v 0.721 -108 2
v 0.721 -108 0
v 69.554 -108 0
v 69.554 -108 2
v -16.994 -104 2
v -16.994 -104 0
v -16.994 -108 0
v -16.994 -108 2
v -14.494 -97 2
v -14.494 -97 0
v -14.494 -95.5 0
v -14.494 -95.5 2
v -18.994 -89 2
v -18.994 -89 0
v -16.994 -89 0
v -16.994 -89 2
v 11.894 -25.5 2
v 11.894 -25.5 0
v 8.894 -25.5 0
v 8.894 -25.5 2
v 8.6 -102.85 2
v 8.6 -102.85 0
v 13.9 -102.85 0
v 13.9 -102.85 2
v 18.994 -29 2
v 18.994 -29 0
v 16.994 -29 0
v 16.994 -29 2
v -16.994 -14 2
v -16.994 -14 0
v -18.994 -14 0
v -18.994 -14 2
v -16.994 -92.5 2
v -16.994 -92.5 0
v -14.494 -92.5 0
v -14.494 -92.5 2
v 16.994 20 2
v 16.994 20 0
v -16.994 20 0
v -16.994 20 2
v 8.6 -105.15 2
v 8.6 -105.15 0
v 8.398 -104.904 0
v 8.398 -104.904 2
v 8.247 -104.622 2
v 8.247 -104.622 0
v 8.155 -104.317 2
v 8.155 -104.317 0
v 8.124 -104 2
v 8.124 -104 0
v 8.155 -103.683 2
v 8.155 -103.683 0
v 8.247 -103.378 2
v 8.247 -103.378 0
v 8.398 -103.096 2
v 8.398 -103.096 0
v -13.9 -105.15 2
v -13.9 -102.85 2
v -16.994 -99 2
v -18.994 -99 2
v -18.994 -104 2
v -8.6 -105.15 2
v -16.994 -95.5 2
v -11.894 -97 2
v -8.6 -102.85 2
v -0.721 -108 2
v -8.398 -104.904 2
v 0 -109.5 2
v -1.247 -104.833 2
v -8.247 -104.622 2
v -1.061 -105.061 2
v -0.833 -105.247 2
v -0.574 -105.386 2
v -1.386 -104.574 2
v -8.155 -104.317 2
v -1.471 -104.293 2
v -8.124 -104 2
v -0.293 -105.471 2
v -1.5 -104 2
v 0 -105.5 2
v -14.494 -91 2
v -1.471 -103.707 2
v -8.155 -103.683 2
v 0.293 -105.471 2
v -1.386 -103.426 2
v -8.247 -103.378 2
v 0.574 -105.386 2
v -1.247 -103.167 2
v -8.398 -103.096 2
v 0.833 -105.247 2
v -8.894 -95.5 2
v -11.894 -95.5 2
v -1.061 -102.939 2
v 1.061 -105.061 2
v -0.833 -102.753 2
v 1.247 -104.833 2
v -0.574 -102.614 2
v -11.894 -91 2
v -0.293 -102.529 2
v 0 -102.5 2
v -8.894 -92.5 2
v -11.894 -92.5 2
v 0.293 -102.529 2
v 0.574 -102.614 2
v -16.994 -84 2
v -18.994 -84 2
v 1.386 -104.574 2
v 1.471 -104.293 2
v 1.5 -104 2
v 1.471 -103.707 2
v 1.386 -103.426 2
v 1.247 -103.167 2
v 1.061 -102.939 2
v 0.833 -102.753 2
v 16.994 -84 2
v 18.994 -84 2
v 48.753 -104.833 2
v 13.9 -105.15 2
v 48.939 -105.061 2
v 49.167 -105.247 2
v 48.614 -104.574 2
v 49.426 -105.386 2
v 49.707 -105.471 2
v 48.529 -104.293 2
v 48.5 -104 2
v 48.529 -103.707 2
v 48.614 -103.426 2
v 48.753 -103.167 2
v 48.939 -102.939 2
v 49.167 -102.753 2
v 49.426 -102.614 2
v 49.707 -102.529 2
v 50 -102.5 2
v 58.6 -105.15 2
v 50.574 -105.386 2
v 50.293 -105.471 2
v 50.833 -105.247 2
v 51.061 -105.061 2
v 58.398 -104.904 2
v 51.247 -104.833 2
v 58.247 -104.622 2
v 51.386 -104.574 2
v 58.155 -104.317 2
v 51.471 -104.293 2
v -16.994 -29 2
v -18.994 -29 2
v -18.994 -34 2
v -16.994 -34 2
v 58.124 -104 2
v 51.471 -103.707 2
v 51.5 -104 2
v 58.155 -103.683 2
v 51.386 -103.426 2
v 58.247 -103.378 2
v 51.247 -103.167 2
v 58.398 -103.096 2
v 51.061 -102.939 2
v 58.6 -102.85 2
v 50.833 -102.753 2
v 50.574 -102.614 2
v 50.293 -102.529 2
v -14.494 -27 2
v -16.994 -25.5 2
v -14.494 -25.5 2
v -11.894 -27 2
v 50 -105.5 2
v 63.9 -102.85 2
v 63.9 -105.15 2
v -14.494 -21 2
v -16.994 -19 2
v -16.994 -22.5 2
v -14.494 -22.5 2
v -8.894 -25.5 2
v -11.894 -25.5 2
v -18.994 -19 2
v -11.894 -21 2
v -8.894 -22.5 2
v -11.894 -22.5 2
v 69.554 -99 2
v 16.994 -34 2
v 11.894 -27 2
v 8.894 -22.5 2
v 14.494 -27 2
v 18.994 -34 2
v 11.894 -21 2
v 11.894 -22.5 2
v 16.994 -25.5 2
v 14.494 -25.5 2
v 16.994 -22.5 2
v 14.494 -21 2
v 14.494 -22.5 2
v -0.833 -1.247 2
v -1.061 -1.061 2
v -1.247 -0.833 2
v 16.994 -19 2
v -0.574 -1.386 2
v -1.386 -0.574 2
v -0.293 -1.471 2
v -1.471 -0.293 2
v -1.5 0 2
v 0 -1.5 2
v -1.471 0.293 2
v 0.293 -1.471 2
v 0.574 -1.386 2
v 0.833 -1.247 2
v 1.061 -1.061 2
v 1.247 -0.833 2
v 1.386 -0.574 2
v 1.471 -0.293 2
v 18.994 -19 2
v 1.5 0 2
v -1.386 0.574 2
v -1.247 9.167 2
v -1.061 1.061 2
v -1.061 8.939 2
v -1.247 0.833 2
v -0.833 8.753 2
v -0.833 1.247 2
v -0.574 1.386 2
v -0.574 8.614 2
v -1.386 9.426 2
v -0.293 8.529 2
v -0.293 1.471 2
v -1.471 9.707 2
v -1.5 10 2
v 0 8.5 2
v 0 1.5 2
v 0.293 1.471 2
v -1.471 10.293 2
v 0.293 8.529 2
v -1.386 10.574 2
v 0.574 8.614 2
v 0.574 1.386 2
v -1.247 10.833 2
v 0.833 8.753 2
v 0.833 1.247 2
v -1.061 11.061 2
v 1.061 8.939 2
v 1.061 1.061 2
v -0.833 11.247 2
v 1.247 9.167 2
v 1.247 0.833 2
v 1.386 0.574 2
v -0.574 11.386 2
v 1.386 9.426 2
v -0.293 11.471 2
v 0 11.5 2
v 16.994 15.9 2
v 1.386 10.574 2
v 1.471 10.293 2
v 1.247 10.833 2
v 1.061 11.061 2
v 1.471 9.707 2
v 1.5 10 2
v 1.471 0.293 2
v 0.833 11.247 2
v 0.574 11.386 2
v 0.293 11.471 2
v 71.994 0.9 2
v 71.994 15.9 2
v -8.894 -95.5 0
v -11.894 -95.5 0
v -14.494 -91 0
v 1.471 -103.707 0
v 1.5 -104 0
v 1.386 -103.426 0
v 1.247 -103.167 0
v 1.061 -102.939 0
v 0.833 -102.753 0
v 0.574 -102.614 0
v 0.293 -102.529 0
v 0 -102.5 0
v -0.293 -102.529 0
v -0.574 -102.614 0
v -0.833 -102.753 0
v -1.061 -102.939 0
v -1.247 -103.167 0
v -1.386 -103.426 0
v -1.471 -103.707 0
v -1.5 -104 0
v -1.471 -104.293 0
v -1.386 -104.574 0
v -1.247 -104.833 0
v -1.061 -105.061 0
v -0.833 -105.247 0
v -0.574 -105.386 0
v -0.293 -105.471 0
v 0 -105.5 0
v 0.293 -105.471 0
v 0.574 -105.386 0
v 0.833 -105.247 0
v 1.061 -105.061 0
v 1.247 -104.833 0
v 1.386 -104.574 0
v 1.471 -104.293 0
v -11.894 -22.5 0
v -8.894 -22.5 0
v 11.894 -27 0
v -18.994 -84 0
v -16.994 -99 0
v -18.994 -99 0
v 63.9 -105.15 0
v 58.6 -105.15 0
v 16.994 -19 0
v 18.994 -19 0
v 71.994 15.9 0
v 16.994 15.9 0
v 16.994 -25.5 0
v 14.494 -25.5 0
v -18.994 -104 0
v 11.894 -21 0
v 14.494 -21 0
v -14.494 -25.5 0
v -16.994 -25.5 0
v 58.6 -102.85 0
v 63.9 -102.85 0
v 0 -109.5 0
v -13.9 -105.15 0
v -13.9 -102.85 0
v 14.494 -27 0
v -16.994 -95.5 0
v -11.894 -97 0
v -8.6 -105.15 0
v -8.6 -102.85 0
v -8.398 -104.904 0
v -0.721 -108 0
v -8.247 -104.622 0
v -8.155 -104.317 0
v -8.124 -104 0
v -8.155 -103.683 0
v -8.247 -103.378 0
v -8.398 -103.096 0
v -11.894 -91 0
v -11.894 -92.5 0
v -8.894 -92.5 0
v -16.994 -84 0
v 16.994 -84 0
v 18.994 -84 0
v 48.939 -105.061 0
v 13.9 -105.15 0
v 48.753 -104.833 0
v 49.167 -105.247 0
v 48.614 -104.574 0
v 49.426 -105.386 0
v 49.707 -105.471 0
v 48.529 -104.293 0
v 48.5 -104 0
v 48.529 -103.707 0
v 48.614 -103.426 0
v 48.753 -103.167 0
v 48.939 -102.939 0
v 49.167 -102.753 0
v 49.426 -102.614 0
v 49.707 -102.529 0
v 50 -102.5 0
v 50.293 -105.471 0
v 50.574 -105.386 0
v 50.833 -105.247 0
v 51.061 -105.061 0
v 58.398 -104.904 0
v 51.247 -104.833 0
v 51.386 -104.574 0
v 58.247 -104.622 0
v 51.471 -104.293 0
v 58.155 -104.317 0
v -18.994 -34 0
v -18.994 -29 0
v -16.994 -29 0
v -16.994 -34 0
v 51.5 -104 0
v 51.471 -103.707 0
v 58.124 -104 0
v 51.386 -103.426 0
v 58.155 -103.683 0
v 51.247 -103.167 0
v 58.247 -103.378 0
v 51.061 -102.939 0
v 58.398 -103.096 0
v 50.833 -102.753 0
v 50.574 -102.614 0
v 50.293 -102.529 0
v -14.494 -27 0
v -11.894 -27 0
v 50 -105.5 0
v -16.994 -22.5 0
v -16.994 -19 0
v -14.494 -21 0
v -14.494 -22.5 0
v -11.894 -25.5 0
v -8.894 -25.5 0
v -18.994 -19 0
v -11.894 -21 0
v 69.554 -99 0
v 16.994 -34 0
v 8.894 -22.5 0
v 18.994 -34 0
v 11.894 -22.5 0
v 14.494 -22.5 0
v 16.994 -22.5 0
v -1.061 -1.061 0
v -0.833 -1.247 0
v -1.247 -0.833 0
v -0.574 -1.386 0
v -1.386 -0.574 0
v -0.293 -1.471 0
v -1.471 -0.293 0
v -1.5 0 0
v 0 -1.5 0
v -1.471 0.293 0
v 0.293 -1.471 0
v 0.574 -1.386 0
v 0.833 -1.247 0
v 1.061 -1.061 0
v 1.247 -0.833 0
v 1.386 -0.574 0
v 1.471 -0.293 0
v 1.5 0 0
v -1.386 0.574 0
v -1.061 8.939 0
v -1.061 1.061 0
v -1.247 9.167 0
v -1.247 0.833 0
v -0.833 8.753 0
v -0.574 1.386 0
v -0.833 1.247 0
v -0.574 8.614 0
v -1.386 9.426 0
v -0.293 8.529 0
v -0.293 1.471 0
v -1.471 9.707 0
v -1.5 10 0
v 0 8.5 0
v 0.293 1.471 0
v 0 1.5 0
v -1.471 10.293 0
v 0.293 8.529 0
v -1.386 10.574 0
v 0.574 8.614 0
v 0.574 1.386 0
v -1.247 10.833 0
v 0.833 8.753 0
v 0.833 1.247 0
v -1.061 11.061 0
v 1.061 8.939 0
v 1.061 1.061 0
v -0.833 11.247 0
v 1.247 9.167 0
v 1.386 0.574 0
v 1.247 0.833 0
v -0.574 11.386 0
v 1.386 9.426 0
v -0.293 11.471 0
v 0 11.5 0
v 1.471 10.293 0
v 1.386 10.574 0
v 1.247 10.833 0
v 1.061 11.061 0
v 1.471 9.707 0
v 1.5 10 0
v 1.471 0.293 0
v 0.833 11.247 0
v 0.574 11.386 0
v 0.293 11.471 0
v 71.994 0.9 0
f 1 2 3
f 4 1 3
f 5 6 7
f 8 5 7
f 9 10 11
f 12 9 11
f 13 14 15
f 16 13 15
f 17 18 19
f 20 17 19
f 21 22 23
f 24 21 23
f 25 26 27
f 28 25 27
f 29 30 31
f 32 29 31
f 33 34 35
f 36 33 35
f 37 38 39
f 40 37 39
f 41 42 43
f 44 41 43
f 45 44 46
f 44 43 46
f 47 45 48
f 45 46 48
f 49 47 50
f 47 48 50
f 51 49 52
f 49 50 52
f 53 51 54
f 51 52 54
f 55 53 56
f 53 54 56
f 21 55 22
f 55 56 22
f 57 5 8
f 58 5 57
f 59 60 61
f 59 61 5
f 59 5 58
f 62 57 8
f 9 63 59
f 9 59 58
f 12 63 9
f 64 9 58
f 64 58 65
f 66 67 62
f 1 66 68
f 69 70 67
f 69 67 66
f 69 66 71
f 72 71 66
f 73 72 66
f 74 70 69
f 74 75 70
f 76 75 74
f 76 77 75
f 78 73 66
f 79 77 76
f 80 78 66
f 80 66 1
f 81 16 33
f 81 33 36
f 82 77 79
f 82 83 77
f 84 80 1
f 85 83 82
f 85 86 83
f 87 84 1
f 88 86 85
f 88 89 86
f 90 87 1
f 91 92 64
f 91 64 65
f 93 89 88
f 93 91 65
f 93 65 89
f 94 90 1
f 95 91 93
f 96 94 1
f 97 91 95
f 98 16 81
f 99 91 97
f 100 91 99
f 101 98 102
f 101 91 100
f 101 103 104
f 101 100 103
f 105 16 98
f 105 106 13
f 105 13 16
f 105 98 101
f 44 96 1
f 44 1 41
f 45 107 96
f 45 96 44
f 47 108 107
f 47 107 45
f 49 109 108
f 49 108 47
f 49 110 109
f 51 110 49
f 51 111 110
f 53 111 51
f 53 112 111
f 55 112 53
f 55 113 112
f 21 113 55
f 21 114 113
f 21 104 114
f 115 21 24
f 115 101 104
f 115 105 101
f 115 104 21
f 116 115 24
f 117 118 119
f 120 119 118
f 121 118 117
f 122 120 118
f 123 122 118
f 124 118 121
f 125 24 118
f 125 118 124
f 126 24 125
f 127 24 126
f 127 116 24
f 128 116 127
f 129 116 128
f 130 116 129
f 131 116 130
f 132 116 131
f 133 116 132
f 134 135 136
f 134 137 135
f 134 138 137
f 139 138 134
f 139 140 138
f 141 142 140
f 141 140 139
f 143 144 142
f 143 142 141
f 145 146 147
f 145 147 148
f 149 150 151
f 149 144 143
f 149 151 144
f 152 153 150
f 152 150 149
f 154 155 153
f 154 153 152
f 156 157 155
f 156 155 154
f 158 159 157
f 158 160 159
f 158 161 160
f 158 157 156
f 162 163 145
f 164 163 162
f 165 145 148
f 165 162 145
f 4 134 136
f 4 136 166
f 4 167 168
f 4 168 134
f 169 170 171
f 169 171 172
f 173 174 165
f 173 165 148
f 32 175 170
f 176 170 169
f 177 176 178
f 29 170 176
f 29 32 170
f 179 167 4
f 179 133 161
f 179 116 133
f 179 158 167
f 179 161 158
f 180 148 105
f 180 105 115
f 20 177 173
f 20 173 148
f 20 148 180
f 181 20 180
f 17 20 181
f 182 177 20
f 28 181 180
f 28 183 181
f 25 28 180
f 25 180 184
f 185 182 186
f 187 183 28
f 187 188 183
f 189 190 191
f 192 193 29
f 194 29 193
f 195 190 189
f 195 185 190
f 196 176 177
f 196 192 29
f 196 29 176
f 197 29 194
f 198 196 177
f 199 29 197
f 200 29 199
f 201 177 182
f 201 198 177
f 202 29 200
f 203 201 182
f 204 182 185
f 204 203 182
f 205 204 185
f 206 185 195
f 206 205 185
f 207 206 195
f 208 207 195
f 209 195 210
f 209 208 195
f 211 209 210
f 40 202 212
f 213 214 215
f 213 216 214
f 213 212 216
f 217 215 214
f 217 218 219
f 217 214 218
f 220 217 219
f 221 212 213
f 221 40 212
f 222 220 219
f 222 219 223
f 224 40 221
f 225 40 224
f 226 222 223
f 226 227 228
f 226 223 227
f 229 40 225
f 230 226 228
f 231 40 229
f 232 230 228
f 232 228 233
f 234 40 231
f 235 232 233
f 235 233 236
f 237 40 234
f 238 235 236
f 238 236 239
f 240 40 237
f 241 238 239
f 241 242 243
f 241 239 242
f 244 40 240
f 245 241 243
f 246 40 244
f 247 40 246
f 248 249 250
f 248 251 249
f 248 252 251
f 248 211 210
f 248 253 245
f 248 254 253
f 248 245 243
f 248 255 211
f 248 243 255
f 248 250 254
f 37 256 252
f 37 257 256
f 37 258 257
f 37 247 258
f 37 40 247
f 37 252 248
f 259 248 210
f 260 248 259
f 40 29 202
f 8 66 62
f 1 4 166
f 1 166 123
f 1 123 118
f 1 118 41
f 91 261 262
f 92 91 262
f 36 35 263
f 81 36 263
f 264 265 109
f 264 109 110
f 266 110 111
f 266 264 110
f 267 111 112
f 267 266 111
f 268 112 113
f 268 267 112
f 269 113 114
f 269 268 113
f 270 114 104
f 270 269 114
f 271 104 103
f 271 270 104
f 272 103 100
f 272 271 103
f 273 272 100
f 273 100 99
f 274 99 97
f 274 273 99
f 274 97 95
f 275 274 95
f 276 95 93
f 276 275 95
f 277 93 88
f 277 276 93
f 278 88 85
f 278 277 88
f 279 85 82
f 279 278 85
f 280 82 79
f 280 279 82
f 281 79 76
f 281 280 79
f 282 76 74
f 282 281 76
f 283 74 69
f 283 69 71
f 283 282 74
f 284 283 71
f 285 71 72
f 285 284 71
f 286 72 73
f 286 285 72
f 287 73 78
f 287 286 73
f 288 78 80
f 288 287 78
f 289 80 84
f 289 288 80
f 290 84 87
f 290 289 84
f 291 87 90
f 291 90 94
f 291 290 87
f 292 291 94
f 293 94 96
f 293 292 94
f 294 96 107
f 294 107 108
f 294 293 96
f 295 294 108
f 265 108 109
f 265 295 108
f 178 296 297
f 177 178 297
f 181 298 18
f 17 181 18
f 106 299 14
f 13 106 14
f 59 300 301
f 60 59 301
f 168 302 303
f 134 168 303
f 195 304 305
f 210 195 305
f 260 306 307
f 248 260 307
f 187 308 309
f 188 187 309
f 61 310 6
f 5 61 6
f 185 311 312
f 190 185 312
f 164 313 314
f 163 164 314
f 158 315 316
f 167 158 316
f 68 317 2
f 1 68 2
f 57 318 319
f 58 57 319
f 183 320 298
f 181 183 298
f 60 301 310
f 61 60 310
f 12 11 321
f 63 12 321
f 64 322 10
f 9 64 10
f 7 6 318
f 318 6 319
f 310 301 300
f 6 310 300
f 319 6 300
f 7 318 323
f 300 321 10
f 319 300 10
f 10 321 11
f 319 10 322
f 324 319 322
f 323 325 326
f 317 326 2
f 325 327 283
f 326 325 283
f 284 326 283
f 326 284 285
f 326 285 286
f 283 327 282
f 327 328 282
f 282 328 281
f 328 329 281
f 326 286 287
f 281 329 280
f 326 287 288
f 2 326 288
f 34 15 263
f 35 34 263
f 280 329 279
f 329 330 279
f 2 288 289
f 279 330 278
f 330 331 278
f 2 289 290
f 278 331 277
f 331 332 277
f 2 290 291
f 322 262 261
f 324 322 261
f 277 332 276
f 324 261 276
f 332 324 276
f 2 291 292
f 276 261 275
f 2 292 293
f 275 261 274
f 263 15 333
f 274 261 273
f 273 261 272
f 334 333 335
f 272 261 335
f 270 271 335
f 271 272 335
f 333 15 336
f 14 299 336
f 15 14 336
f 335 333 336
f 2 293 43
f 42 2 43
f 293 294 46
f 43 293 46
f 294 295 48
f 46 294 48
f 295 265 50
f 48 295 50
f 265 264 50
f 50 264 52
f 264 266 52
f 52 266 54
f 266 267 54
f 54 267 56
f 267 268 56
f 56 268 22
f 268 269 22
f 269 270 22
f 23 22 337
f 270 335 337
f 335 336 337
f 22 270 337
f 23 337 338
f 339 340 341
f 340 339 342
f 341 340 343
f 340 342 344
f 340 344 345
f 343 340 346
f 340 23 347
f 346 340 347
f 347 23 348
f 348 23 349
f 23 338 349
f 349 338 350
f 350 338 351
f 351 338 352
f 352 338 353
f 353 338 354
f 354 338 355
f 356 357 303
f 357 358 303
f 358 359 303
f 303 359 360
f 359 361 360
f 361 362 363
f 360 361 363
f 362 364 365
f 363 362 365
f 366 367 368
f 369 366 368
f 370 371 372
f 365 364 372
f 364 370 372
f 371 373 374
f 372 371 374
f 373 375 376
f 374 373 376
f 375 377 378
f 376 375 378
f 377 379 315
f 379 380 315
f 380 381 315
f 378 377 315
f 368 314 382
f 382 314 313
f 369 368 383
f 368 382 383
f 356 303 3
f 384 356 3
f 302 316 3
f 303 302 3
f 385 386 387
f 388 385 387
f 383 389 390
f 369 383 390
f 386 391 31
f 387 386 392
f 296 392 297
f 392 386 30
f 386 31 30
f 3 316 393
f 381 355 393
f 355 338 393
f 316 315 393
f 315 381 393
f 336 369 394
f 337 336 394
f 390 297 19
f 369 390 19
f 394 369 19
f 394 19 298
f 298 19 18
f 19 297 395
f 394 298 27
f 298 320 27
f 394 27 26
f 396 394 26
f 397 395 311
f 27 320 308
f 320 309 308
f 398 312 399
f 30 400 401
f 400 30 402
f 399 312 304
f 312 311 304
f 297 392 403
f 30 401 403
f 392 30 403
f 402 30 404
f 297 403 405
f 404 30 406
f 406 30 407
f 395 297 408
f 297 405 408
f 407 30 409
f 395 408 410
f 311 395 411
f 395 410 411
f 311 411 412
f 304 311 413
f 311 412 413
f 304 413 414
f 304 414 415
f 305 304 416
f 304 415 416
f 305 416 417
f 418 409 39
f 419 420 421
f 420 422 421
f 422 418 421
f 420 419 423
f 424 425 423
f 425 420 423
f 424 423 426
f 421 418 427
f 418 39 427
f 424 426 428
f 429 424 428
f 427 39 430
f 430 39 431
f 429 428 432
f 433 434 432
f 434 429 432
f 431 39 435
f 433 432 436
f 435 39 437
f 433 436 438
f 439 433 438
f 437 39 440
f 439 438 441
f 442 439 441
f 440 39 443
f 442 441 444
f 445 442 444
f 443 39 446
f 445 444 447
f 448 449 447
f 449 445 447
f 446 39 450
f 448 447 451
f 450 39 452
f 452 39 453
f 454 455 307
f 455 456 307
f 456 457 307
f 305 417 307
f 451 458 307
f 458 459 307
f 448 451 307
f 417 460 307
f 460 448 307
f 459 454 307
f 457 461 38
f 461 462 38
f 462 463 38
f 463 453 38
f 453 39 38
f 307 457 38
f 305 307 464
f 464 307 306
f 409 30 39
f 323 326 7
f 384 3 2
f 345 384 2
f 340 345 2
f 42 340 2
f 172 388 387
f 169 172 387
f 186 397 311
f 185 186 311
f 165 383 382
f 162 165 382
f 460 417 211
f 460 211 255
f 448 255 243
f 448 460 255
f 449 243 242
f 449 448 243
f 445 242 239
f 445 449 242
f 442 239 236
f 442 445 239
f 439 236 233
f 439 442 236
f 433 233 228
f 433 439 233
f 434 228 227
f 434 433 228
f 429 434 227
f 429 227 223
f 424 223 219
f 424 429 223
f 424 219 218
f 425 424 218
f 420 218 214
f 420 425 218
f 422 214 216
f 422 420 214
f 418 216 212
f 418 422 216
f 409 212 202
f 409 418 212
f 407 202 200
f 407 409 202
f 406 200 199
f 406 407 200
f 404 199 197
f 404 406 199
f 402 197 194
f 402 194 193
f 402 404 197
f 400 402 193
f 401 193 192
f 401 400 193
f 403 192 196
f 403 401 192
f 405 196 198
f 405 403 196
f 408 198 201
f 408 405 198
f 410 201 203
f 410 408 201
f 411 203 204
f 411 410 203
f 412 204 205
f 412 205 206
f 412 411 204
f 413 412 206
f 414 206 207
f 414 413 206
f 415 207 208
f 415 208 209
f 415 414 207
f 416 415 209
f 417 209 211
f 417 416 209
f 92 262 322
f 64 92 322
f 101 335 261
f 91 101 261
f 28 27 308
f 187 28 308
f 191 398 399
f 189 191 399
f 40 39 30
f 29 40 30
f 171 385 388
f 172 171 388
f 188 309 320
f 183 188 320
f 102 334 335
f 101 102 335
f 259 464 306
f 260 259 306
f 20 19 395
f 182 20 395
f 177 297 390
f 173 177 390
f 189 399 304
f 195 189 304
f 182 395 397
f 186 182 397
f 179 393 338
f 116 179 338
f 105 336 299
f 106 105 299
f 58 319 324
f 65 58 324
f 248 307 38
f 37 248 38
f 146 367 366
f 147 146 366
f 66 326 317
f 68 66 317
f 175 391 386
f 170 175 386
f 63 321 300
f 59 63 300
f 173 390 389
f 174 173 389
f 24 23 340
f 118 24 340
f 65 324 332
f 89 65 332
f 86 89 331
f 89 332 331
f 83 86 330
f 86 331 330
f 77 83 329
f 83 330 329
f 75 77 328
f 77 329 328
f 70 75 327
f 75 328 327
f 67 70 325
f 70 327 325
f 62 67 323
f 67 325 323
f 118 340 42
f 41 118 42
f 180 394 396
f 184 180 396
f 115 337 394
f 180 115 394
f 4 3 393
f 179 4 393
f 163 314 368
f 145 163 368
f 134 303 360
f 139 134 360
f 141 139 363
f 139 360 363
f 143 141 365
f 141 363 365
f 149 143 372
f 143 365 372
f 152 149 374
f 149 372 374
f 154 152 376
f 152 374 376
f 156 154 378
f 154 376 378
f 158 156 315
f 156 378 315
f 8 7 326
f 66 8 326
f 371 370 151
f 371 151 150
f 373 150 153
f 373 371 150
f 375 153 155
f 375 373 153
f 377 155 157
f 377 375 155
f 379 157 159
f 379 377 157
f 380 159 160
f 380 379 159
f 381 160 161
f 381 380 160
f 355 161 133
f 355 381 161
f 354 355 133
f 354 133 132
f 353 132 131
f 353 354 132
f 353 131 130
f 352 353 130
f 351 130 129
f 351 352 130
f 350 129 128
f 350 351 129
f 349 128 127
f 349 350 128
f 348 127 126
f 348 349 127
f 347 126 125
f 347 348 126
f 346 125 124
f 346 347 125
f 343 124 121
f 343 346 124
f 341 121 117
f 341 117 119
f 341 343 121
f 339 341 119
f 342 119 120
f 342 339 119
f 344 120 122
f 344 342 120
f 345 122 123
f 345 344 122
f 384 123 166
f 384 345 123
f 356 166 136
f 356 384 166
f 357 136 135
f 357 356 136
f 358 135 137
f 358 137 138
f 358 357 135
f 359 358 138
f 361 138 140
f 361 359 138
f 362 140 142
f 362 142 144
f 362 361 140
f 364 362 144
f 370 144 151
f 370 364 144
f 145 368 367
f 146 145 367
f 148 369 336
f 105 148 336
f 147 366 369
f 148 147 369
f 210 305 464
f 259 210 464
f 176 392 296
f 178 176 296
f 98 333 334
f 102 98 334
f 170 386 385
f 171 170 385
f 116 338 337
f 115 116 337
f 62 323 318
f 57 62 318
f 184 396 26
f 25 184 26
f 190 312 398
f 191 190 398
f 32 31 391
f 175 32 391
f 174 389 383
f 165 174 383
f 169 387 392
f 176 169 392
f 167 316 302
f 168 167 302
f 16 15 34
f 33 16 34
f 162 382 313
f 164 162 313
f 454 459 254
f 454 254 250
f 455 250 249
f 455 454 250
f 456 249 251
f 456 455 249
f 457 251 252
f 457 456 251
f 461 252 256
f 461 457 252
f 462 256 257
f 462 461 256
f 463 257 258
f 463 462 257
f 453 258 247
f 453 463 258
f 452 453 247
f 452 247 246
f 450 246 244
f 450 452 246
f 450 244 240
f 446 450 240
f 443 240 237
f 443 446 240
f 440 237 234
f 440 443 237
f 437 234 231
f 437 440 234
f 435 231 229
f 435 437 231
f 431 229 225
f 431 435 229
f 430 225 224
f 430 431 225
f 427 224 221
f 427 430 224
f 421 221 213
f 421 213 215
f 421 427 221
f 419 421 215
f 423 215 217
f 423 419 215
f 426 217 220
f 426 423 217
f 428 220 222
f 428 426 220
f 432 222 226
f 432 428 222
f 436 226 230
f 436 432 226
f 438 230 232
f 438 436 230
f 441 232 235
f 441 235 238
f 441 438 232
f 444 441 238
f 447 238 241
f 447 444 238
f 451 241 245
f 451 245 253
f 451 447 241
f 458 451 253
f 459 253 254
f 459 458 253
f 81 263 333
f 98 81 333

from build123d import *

# Parameters (mm, degrees)
SKETCH_1_R      = 1.5
EXTRUDE_1_DEPTH = 2


with BuildPart() as part:
    # 草图1 → 凸台-拉伸1 (new body)
    with BuildSketch(Plane.XY):
        Polygon((16.993865071, 15.9), (16.993865071, 20), (-16.993865071, 20), (-16.993865071, 15.9), (-16.993865071, -14), (-18.993865071, -14), (-18.993865071, -19), (-16.993865071, -19), (-16.993865071, -22.5), (-14.493865071, -22.5), (-14.493865071, -21), (-11.893865071, -21), (-11.893865071, -22.5), (-8.893865071, -22.5), (-8.893865071, -25.5), (-11.893865071, -25.5), (-11.893865071, -27), (-14.493865071, -27), (-14.493865071, -25.5), (-16.993865071, -25.5), (-16.993865071, -29), (-18.993865071, -29), (-18.993865071, -34), (-16.993865071, -34), (-16.993865071, -84), (-18.993865071, -84), (-18.993865071, -89), (-16.993865071, -89), (-16.993865071, -92.5), (-14.493865071, -92.5), (-14.493865071, -91), (-11.893865071, -91), (-11.893865071, -92.5), (-8.893865071, -92.5), (-8.893865071, -95.5), (-11.893865071, -95.5), (-11.893865071, -97), (-14.493865071, -97), (-14.493865071, -95.5), (-16.993865071, -95.5), (-16.993865071, -99), (-18.993865071, -99), (-18.993865071, -104), (-16.993865071, -104), (-16.993865071, -108), (-0.721190694, -108), (0, -109.5), (0.721190694, -108), (16.993865071, -108), (69.553865071, -108), (69.553865071, -105), (69.553865071, -99), (18.993865071, -84), (16.993865071, -84), (16.993865071, -34), (18.993865071, -34), (18.993865071, -29), (16.993865071, -29), (16.993865071, -25.5), (14.493865071, -25.5), (14.493865071, -27), (11.893865071, -27), (11.893865071, -25.5), (8.893865071, -25.5), (8.893865071, -22.5), (11.893865071, -22.5), (11.893865071, -21), (14.493865071, -21), (14.493865071, -22.5), (16.993865071, -22.5), (16.993865071, -19), (18.993865071, -19), (71.993865071, 0.9), (71.993865071, 15.9), align=None)
        with Locations((0, -104)):
            Circle(SKETCH_1_R, mode=Mode.SUBTRACT)
        Circle(SKETCH_1_R, mode=Mode.SUBTRACT)
        with Locations((0, 10)):
            Circle(SKETCH_1_R, mode=Mode.SUBTRACT)
        with Locations((50, -104)):
            Circle(SKETCH_1_R, mode=Mode.SUBTRACT)
        with BuildLine():
            Line((13.9, -105.15), (8.6, -105.15))
            ThreePointArc((8.6, -105.15), (8.123654403, -104), (8.6, -102.85))
            Line((8.6, -102.85), (13.9, -102.85))
            Line((13.9, -102.85), (13.9, -105.15))
        make_face(mode=Mode.SUBTRACT)
        with BuildLine():
            Line((-13.9, -102.85), (-8.6, -102.85))
            ThreePointArc((-8.6, -102.85), (-8.123654403, -104), (-8.6, -105.15))
            Line((-8.6, -105.15), (-13.9, -105.15))
            Line((-13.9, -105.15), (-13.9, -102.85))
        make_face(mode=Mode.SUBTRACT)
        with BuildLine():
            Line((63.9, -105.15), (58.6, -105.15))
            ThreePointArc((58.6, -105.15), (58.123654403, -104), (58.6, -102.85))
            Line((58.6, -102.85), (63.9, -102.85))
            Line((63.9, -102.85), (63.9, -105.15))
        make_face(mode=Mode.SUBTRACT)
    extrude(amount=EXTRUDE_1_DEPTH)


solid = part.part
